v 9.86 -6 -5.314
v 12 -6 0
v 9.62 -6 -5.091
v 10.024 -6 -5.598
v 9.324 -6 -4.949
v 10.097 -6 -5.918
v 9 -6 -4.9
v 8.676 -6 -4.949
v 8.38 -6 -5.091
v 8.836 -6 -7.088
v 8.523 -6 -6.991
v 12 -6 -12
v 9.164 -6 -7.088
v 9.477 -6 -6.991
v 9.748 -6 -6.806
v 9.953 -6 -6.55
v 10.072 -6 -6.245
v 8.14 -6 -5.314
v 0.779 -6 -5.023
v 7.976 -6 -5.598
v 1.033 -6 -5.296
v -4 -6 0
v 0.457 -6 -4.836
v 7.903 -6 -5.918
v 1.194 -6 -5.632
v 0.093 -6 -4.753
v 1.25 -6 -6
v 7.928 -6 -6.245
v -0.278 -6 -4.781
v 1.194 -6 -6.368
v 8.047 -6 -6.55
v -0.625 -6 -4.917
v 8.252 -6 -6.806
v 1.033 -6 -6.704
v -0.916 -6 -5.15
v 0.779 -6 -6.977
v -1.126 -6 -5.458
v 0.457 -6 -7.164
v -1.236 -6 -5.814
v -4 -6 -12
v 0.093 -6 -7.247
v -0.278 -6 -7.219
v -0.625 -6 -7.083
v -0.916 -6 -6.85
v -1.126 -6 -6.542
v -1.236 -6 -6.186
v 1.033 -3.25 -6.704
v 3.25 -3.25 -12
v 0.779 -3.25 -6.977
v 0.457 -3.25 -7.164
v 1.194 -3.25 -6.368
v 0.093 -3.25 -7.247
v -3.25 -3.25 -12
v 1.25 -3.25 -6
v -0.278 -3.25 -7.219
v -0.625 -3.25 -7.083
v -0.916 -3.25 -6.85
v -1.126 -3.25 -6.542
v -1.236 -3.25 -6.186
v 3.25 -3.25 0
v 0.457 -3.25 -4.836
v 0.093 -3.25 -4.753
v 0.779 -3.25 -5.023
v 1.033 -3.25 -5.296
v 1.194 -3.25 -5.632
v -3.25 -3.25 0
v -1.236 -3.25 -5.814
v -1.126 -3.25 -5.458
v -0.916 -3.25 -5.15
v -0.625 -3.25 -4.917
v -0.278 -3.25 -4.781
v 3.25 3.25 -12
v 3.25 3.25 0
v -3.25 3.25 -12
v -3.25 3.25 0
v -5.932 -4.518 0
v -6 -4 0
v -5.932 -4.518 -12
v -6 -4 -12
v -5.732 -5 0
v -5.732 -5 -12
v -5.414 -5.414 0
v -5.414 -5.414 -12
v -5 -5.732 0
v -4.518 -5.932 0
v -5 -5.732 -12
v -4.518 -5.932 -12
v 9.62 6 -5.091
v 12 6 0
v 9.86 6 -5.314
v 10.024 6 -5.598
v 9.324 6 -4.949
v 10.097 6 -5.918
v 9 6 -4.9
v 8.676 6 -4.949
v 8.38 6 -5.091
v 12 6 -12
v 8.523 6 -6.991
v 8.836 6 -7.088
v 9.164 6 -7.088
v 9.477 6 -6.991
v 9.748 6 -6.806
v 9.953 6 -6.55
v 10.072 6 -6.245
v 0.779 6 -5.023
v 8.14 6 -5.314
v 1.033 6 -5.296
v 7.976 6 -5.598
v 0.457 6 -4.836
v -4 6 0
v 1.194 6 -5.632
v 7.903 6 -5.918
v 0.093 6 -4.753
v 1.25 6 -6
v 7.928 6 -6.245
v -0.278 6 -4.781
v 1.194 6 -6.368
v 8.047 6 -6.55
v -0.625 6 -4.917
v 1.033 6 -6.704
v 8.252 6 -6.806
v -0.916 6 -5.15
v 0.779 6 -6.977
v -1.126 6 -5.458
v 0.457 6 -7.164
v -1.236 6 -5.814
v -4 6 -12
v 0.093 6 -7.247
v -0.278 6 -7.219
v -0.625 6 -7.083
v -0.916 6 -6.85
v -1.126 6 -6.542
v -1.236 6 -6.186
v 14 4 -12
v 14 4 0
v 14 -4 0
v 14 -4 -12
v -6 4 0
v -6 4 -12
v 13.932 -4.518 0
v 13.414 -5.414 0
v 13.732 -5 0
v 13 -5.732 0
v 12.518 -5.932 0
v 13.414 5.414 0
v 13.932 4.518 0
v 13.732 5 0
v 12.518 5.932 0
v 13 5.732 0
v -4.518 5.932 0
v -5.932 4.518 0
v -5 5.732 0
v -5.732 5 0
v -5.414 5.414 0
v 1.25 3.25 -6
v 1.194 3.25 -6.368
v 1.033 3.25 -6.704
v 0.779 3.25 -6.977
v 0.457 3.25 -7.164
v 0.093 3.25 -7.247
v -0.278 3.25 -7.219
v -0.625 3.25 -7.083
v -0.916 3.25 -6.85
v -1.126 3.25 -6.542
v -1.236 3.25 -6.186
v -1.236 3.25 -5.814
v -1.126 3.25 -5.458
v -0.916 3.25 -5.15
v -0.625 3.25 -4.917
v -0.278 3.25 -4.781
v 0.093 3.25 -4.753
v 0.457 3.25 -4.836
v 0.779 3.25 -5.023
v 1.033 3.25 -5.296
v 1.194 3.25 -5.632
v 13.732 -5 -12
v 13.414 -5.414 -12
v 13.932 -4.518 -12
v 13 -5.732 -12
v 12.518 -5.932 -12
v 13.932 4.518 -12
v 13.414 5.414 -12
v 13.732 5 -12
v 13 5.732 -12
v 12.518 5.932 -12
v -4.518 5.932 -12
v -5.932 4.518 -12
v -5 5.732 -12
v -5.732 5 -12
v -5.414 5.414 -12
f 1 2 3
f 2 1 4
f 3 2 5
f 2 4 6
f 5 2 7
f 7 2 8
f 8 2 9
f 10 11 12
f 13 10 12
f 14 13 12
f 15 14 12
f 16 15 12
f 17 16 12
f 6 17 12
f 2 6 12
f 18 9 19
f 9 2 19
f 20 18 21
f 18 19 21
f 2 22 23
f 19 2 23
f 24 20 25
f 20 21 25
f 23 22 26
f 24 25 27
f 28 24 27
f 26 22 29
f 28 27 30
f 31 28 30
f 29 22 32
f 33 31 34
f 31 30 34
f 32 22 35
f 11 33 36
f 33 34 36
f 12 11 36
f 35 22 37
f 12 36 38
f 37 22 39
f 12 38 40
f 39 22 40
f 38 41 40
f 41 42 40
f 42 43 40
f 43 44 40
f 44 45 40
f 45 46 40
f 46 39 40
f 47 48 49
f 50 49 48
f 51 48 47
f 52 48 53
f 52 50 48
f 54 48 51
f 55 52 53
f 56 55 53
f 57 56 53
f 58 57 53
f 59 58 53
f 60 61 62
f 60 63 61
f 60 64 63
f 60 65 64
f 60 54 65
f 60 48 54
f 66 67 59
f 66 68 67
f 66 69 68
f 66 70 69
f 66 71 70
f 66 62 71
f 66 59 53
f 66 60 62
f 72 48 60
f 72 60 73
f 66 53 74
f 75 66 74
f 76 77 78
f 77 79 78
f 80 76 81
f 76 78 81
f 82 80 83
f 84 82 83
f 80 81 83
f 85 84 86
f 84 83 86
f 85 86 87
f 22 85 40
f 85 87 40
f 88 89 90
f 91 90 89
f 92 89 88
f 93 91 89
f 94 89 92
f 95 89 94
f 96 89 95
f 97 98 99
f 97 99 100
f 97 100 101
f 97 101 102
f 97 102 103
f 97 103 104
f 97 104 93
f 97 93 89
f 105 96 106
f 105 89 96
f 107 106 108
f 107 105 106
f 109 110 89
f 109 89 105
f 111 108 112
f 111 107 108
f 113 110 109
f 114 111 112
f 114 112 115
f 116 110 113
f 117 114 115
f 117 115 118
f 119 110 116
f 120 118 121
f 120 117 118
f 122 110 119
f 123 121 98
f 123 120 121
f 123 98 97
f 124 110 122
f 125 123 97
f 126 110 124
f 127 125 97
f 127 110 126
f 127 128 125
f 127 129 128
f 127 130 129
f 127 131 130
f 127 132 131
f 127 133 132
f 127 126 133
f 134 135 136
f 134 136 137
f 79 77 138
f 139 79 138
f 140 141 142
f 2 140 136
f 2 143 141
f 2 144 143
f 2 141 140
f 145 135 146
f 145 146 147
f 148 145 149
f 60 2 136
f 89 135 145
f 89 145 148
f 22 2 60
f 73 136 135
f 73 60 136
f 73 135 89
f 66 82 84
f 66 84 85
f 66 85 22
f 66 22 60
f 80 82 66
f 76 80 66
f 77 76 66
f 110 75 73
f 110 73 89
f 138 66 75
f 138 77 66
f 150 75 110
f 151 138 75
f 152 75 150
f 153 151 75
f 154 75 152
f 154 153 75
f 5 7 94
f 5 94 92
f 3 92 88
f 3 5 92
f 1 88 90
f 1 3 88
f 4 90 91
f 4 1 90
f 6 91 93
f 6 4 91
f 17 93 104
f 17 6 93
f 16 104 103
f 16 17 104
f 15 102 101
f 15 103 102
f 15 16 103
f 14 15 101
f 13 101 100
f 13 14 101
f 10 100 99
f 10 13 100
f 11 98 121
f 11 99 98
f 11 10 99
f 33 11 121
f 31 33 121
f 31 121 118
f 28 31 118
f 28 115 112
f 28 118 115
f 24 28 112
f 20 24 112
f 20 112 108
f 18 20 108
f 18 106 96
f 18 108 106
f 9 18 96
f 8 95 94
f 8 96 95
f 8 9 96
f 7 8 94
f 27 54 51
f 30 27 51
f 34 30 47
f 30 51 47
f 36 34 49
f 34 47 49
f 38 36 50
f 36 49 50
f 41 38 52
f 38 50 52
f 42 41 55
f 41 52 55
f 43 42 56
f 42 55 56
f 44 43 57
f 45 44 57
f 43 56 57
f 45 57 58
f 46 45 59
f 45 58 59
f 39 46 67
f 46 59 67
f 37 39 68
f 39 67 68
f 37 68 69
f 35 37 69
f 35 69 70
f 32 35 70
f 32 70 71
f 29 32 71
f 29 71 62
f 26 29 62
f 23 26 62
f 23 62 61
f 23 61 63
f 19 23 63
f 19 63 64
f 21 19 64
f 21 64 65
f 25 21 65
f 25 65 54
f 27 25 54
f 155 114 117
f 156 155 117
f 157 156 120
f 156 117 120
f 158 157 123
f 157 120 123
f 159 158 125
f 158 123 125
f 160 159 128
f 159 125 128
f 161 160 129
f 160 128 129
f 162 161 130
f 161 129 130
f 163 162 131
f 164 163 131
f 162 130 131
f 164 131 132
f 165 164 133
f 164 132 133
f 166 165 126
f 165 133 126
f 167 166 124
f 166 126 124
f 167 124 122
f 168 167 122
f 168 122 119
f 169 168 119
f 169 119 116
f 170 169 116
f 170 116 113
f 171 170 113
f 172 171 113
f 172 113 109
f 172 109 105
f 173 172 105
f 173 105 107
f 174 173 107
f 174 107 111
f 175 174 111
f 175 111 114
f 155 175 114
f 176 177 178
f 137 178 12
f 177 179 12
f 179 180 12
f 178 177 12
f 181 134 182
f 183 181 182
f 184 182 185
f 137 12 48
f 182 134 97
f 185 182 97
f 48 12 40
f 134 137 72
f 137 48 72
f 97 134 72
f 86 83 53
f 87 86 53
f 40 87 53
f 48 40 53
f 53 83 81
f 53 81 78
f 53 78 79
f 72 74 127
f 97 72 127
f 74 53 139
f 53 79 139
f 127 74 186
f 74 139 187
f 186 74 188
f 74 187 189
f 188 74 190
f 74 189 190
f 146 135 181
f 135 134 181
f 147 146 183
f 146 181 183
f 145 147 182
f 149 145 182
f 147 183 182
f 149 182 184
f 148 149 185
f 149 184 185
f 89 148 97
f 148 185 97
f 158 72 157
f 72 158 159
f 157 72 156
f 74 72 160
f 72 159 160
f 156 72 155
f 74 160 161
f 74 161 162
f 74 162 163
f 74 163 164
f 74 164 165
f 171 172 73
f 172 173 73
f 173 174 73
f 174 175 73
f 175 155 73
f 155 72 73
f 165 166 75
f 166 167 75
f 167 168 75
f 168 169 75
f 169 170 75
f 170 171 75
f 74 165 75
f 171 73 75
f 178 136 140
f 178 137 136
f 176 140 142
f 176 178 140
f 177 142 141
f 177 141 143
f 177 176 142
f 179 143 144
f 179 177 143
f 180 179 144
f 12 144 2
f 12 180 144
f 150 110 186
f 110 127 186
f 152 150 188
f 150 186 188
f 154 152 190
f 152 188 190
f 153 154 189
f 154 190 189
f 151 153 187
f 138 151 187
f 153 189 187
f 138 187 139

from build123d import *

# Parameters (mm, degrees)
SKETCH1_R               = 4.5
SKETCH1_R_2             = 1.25
BOSS_EXTRUDE1_DEPTH     = 8
SKETCH2_R               = 1.75
SKETCH2_R_2             = 1.25
CUT_EXTRUDE1_DEPTH      = 4
SKETCH4_W               = 12
SKETCH4_H               = 12
SKETCH4_W_2             = 6.5
SKETCH4_H_2             = 6.5
BOSS_EXTRUDE2_DEPTH     = 12
SKETCH5_W               = 12
SKETCH5_H               = 12
BOSS_EXTRUDE3_DEPTH     = 8
CUT_EXTRUDE2_DEPTH      = 23
CUT_EXTRUDE2_DEPTH_BACK = 23
SKETCH6_R               = 1.1
FILLET1_R               = 2
SKETCH1_2_R             = 4.5
SKETCH1_2_R_2           = 1.25
CUT_EXTRUDE5_DEPTH      = 8
CUT_EXTRUDE6_DEPTH      = 13


with BuildPart() as part:
    # Sketch1 → Boss-Extrude1 (new body)
    with BuildSketch(Plane.XY):
        Circle(SKETCH1_R)
        Circle(SKETCH1_R_2, mode=Mode.SUBTRACT)
    extrude(amount=BOSS_EXTRUDE1_DEPTH)

    # Sketch2 → Cut-Extrude1 (cut)
    with BuildSketch(Plane(origin=(0, 0, 0), x_dir=(-1, 0, 0), z_dir=(0, 0, -1))):
        Circle(SKETCH2_R)
        Circle(SKETCH2_R_2, mode=Mode.SUBTRACT)
    extrude(amount=-CUT_EXTRUDE1_DEPTH, mode=Mode.SUBTRACT)

    # Sketch4 → Boss-Extrude2 (add)
    with BuildSketch(Plane(origin=(0, 0, 0), x_dir=(-1, 0, 0), z_dir=(0, 0, -1))):
        Rectangle(SKETCH4_W, SKETCH4_H)
        Rectangle(SKETCH4_W_2, SKETCH4_H_2, mode=Mode.SUBTRACT)
    extrude(amount=BOSS_EXTRUDE2_DEPTH)

    # Sketch5 → Boss-Extrude3 (add)
    with BuildSketch(Plane(origin=(6, 0, 0), x_dir=(0, 0, -1), z_dir=(1, 0, 0))):
        with Locations((6, 0)):
            Rectangle(SKETCH5_W, SKETCH5_H)
    extrude(amount=BOSS_EXTRUDE3_DEPTH)

    # Sketch6 → Cut-Extrude2 (cut, two sides: drawn at the far end of the back side and taken through both)
    with BuildSketch(Plane(origin=(0, 6, 0), x_dir=(1, 0, 0), z_dir=(0, 1, 0)).offset(-CUT_EXTRUDE2_DEPTH_BACK)):
        with Locations(Location((9, 6, 0), (0, 0, 270))):
            Circle(SKETCH6_R)
    extrude(amount=CUT_EXTRUDE2_DEPTH + CUT_EXTRUDE2_DEPTH_BACK, mode=Mode.SUBTRACT)

    # Fillet1
    fillet1_edges = [part.edges().sort_by_distance(p)[0] for p in [
        (-6, -6, -6),
        (-6, 6, -6),
        (14, 6, -6),
        (14, -6, -6),
    ]]
    fillet(fillet1_edges, radius=FILLET1_R)

    # Sketch1<2> → Cut-Extrude5 (cut)
    with BuildSketch(Plane.XY):
        Circle(SKETCH1_2_R)
        Circle(SKETCH1_2_R_2, mode=Mode.SUBTRACT)
    extrude(amount=CUT_EXTRUDE5_DEPTH, mode=Mode.SUBTRACT)

    # Sketch7 → Cut-Extrude6 (cut)
    with BuildSketch(Plane(origin=(0, 6, 0), x_dir=(1, 0, 0), z_dir=(0, 1, 0))):
        with BuildLine():
            ThreePointArc((-1.25, 6), (0, 4.75), (1.25, 6))
            Line((1.25, 6), (-1.25, 6))
        make_face()
        with BuildLine():
            Line((-1.25, 6), (1.25, 6))
            ThreePointArc((1.25, 6), (0, 7.25), (-1.25, 6))
        make_face()
    extrude(amount=-CUT_EXTRUDE6_DEPTH, mode=Mode.SUBTRACT)


solid = part.part
